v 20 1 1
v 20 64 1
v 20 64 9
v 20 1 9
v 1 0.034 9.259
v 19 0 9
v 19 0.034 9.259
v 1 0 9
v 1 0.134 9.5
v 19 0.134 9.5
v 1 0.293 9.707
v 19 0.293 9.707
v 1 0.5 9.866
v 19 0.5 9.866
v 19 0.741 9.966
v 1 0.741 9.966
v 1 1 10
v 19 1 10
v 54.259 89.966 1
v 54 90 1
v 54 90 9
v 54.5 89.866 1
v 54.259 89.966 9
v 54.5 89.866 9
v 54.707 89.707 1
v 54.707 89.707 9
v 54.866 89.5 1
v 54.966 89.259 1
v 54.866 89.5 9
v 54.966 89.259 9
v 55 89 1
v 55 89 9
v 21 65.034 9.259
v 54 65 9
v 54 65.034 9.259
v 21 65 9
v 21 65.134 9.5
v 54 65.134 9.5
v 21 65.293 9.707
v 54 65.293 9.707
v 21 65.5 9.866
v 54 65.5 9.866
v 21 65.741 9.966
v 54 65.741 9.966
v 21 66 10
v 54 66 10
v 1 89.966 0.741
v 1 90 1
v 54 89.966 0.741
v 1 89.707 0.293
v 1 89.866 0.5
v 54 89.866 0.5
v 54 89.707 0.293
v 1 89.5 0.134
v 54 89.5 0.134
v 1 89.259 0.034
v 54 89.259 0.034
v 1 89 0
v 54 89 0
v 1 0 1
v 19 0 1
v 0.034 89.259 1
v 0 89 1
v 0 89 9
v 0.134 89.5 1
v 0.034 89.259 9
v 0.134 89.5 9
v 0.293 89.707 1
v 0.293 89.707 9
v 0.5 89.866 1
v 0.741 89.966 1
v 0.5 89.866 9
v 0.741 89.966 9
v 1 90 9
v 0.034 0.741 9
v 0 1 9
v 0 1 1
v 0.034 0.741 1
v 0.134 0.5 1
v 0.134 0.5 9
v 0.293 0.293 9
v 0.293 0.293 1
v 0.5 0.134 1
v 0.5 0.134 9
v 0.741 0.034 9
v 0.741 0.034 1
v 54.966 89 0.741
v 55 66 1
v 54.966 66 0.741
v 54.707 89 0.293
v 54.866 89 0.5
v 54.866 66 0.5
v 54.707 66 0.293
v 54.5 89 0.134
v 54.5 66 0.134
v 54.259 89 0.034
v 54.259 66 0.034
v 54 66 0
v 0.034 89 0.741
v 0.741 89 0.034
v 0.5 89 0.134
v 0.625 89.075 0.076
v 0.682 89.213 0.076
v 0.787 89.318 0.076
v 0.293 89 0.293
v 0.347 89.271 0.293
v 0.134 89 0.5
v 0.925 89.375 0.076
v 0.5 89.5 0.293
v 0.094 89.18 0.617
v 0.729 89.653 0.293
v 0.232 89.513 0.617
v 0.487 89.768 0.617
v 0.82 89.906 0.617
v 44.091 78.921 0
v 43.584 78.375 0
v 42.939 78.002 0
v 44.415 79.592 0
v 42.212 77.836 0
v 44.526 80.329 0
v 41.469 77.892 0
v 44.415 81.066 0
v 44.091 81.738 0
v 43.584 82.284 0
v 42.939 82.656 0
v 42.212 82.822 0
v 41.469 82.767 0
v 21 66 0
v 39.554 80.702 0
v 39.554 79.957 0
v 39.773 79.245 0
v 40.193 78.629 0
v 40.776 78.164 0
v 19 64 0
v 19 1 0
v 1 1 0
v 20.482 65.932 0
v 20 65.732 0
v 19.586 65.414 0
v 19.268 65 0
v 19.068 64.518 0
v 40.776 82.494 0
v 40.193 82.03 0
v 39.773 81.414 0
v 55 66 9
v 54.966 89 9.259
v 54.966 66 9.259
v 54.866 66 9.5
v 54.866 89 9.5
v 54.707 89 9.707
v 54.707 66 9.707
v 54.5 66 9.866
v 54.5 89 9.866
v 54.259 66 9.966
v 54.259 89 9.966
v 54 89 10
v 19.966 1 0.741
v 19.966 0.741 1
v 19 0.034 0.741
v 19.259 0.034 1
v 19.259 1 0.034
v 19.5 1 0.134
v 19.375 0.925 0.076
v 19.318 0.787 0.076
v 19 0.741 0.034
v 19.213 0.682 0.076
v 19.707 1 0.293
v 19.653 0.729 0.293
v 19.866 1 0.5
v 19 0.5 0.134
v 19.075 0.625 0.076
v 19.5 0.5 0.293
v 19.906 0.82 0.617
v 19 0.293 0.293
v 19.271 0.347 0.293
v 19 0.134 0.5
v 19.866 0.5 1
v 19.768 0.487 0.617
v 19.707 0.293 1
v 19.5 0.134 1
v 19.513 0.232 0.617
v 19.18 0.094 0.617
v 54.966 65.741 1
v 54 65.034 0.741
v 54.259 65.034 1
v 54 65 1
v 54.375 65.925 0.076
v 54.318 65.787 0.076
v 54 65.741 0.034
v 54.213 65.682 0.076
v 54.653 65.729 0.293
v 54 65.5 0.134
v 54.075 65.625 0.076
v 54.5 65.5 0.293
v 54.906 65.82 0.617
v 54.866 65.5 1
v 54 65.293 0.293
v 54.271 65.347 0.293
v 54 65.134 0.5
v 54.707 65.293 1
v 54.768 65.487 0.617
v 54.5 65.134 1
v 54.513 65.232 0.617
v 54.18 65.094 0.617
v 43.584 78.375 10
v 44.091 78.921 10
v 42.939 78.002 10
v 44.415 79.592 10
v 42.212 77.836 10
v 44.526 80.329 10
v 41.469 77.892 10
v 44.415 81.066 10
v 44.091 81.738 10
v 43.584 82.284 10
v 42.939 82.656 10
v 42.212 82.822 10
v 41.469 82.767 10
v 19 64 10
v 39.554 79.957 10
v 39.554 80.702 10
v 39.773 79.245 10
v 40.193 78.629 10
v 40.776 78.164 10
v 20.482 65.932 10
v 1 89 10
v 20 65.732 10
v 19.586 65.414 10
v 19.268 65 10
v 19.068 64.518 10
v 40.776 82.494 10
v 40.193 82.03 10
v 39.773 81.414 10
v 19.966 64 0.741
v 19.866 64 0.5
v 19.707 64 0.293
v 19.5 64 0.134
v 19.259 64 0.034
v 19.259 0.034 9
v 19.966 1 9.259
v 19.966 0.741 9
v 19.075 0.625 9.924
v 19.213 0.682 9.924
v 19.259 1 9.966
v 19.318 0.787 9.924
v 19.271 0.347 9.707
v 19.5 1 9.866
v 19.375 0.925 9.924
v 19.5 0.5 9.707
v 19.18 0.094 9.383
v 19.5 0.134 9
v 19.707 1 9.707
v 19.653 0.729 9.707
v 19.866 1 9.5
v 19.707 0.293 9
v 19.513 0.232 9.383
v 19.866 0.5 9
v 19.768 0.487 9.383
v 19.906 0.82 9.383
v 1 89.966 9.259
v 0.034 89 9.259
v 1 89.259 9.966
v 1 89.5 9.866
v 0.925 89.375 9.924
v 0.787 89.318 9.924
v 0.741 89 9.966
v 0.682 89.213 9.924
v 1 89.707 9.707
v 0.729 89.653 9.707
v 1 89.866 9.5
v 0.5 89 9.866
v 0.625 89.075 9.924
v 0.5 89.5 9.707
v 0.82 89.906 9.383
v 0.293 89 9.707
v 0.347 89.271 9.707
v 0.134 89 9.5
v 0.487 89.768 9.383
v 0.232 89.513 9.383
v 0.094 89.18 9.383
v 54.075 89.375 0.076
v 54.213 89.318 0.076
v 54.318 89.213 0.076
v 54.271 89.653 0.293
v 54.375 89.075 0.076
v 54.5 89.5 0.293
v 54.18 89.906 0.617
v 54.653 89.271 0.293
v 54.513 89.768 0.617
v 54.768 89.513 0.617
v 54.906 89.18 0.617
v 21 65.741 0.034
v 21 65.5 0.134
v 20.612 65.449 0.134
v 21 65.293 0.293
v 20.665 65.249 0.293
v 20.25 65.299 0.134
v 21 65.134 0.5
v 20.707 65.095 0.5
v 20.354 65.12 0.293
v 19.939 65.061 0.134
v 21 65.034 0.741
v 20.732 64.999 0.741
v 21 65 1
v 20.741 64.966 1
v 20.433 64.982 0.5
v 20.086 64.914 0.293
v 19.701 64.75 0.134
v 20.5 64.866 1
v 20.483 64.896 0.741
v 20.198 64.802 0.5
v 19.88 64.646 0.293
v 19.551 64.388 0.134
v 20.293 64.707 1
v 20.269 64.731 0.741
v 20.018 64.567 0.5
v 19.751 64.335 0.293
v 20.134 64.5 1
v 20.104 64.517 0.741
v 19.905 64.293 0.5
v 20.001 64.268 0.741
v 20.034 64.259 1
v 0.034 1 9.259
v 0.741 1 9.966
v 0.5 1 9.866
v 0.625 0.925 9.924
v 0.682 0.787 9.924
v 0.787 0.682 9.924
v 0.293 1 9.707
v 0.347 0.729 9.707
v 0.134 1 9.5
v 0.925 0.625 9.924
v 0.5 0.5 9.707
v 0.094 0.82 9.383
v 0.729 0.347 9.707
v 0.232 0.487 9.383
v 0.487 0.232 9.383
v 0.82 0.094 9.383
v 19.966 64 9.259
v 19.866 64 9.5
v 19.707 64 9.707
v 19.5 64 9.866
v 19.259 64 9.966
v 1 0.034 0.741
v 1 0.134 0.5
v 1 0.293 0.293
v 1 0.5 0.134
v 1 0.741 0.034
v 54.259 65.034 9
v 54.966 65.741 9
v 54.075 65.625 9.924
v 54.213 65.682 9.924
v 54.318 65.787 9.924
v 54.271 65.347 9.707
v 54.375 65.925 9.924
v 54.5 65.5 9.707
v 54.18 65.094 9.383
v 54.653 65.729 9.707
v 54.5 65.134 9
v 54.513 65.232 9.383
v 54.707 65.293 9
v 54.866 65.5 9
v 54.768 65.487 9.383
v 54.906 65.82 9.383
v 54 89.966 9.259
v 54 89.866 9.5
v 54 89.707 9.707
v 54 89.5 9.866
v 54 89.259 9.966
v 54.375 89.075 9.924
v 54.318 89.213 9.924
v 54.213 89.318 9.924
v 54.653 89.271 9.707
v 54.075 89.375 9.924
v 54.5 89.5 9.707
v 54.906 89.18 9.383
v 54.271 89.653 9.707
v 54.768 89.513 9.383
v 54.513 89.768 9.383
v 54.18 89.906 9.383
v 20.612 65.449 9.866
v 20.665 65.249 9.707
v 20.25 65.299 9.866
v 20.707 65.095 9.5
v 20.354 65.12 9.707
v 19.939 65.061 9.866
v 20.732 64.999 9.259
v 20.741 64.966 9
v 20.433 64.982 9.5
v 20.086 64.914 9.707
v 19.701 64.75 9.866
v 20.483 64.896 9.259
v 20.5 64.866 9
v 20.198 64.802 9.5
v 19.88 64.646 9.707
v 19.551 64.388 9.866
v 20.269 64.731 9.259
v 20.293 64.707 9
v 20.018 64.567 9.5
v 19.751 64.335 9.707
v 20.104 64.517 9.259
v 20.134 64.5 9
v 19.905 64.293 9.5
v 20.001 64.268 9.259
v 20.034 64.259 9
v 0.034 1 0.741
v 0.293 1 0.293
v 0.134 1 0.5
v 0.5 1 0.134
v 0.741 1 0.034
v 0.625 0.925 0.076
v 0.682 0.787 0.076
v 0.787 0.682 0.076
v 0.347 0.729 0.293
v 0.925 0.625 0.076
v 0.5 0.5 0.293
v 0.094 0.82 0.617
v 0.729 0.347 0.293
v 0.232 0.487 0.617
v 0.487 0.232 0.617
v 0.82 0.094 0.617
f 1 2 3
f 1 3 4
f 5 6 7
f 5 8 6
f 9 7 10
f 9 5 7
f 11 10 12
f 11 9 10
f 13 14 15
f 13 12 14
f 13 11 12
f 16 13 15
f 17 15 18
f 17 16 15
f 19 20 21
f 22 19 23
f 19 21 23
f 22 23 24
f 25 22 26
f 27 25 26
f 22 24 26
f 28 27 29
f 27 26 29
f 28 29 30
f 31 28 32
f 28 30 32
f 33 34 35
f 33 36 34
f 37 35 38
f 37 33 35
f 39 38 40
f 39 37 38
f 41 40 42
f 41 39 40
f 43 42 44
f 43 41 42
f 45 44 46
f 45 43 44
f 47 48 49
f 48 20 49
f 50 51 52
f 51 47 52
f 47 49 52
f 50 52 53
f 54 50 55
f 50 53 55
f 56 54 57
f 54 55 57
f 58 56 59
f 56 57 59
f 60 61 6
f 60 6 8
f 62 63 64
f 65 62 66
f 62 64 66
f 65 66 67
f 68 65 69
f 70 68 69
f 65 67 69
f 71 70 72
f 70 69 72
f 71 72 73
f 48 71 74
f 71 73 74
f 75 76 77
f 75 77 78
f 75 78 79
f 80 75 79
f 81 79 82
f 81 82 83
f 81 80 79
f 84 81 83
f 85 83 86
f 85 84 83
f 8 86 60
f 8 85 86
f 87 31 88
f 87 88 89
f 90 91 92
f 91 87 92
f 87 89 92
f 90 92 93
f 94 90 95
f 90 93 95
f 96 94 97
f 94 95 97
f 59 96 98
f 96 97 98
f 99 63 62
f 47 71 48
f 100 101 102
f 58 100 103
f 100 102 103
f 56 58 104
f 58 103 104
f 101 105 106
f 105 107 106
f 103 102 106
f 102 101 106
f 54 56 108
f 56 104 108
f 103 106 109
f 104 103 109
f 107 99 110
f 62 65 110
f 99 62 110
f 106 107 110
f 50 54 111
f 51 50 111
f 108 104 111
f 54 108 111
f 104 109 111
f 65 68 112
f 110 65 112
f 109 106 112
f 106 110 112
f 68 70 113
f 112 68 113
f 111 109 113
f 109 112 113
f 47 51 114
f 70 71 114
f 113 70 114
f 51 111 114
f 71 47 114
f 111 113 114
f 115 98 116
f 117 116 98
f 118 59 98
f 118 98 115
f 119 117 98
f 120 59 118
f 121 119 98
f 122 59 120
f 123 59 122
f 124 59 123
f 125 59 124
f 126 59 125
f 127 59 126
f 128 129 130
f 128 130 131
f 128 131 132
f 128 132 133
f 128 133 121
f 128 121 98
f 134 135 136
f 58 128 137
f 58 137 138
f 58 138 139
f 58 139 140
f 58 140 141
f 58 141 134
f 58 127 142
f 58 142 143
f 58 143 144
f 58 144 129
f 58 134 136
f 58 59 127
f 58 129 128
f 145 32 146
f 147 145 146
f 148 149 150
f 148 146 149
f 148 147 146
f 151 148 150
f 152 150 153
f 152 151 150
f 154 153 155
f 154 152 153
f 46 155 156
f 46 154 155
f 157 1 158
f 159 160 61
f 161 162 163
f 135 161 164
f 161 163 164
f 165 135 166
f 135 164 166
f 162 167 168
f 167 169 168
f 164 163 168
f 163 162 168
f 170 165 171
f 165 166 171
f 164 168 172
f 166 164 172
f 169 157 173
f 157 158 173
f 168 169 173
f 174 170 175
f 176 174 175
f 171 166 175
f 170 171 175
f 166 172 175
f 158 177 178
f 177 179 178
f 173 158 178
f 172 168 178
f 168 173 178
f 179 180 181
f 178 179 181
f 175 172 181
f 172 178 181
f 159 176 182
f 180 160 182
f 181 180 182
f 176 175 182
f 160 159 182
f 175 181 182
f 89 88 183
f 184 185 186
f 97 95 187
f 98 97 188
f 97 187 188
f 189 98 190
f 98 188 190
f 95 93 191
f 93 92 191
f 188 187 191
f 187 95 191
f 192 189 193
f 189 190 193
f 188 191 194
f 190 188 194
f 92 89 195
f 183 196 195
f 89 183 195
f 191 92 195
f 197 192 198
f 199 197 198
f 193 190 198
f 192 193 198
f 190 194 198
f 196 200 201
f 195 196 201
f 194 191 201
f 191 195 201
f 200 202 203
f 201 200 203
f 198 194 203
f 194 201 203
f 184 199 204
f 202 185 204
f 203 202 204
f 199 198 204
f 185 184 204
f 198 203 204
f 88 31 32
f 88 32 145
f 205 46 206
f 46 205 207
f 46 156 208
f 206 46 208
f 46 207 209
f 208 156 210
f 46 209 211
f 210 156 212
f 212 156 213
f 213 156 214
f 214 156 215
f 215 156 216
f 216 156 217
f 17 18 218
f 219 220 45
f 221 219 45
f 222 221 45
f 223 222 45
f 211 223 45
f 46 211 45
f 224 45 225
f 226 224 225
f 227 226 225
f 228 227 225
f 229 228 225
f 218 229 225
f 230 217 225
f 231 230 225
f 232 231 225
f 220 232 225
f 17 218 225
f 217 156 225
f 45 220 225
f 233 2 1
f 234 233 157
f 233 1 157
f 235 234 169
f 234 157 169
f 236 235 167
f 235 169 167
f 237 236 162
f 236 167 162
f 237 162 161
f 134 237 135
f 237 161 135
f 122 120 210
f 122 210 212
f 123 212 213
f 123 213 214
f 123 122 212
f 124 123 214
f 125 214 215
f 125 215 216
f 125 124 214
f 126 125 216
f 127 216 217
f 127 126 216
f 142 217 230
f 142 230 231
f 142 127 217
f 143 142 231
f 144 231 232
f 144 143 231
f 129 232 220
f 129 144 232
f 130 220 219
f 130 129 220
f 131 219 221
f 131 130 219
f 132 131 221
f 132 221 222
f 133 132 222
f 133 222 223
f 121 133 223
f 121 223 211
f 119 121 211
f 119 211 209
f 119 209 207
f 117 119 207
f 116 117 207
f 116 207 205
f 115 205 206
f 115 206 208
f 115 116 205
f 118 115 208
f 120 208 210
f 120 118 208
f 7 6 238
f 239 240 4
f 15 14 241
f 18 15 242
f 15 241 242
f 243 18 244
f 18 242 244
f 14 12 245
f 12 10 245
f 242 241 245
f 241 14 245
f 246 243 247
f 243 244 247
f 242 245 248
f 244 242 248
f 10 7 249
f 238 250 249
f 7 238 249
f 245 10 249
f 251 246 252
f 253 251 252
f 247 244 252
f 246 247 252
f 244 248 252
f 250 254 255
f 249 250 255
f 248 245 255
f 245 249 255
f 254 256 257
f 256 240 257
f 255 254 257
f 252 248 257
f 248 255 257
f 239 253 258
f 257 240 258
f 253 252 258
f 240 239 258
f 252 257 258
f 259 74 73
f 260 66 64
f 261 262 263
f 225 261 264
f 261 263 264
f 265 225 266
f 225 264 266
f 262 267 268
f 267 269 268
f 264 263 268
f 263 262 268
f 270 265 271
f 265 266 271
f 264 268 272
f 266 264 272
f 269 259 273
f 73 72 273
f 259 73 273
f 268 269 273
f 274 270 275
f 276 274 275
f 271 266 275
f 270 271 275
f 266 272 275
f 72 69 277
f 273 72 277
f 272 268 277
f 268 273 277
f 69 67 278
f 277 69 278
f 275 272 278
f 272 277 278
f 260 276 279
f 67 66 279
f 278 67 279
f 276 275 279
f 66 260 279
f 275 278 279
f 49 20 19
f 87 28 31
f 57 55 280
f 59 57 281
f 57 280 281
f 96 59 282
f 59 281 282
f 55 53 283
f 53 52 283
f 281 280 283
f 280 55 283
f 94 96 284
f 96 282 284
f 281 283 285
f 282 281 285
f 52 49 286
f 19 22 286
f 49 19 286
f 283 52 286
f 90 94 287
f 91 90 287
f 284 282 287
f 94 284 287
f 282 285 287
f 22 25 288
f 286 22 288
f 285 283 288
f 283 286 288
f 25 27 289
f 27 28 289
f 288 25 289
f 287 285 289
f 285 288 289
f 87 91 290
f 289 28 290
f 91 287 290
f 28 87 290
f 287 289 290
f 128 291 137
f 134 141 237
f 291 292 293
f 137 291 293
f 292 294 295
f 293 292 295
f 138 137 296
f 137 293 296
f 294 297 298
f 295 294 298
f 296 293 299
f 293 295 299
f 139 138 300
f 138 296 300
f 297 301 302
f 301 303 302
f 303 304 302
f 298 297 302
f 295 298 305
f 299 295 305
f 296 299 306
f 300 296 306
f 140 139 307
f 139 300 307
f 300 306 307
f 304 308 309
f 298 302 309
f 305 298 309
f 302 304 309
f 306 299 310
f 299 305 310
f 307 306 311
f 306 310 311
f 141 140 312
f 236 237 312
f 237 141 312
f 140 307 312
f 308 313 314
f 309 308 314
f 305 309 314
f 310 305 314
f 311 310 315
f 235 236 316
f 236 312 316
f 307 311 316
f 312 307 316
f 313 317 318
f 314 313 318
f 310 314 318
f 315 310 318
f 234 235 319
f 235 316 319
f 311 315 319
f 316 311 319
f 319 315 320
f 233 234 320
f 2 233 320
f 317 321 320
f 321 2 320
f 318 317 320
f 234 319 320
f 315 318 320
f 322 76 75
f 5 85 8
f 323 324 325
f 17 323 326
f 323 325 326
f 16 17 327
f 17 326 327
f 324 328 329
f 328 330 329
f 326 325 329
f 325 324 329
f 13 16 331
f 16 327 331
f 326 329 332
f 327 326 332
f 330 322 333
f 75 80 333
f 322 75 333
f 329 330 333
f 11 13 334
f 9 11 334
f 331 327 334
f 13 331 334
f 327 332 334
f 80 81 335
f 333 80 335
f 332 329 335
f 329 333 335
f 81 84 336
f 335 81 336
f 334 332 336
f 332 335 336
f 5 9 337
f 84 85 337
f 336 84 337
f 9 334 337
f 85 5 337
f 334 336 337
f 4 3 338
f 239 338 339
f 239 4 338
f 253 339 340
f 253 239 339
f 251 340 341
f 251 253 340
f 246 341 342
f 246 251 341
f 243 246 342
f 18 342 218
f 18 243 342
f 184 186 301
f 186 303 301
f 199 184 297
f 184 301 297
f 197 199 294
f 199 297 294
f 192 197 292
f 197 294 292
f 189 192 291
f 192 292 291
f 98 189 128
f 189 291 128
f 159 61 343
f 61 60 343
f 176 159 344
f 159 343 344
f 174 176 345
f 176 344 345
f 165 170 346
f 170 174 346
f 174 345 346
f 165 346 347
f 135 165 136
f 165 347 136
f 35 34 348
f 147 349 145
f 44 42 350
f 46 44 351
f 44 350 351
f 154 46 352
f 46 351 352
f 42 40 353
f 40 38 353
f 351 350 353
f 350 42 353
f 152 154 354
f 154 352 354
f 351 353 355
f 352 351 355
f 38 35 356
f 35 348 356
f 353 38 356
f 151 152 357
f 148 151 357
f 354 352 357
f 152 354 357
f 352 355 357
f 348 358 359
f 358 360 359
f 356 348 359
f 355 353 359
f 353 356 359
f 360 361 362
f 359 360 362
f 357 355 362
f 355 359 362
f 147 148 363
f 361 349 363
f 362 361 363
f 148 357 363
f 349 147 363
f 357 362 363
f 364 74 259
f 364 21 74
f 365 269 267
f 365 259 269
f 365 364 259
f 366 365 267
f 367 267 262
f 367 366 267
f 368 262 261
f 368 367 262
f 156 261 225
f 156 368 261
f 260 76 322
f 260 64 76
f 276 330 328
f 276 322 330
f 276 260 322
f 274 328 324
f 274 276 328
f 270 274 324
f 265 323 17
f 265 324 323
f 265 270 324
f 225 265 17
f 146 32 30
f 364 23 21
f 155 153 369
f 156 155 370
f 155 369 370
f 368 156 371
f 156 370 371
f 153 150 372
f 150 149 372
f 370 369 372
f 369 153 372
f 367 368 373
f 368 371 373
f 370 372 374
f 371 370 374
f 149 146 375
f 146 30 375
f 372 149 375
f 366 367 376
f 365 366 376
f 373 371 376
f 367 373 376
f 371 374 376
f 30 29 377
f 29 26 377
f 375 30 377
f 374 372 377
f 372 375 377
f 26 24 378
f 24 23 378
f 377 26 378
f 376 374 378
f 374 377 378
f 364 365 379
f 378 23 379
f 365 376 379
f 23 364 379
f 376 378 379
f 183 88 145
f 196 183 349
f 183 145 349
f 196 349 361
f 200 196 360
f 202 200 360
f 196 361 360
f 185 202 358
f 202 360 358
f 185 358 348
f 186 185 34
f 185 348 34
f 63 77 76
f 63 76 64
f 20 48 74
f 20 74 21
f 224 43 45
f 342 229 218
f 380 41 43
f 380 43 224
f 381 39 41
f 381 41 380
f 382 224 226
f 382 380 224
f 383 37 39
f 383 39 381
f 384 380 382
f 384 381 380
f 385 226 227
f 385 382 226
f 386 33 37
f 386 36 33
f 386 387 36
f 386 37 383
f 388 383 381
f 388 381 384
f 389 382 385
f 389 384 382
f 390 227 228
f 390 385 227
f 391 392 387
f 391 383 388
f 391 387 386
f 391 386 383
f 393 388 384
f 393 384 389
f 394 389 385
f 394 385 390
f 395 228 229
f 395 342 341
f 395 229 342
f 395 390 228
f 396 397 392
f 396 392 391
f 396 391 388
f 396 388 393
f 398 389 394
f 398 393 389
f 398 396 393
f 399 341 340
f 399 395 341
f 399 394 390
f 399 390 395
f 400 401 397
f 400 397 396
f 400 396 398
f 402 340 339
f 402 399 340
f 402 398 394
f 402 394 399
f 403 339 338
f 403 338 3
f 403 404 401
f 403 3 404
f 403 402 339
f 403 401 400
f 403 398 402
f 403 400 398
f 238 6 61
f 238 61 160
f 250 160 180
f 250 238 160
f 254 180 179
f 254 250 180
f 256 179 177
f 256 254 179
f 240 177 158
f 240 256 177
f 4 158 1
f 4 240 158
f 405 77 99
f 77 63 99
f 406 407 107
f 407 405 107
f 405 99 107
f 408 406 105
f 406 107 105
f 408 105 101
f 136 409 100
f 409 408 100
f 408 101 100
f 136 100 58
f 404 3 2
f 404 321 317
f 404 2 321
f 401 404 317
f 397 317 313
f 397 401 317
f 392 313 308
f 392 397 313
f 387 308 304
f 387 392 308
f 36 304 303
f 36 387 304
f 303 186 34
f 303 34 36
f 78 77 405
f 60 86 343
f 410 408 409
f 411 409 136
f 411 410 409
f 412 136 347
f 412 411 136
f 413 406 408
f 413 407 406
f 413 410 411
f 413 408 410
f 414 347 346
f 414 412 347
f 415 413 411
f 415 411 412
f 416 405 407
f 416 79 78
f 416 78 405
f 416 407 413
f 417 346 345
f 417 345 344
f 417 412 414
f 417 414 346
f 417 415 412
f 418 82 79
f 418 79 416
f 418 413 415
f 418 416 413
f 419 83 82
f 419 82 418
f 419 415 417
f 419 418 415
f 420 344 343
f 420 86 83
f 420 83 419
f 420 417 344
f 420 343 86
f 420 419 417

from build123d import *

# Parameters (mm, degrees)
SKETCH2_R           = 2.499990149
BOSS_EXTRUDE1_DEPTH = 10
FILLET1_R           = 1


with BuildPart() as part:
    # Sketch2 → Boss-Extrude1 (new body)
    with BuildSketch(Plane.XY):
        Polygon((0, 0), (0, 90), (55, 90), (55, 65), (20, 65), (20, 0), align=None)
        with Locations((42.025587792, 80.329294261)):
            Circle(SKETCH2_R, mode=Mode.SUBTRACT)
    extrude(amount=BOSS_EXTRUDE1_DEPTH)

    # Fillet1
    fillet1_edges = [part.edges().sort_by_distance(p)[0] for p in [
        (0, 0, 5),
        (0, 90, 5),
        (55, 90, 5),
        (55, 65, 5),
        (20, 65, 5),
        (20, 0, 5),
        (37.5, 65, 10),
        (55, 77.5, 10),
        (27.5, 90, 10),
        (0, 45, 10),
        (10, 0, 10),
        (0, 45, 0),
        (27.5, 90, 0),
        (55, 77.5, 0),
        (37.5, 65, 0),
        (20, 32.5, 0),
        (10, 0, 0),
        (20, 32.5, 10),
    ]]
    fillet(fillet1_edges, radius=FILLET1_R)


solid = part.part
